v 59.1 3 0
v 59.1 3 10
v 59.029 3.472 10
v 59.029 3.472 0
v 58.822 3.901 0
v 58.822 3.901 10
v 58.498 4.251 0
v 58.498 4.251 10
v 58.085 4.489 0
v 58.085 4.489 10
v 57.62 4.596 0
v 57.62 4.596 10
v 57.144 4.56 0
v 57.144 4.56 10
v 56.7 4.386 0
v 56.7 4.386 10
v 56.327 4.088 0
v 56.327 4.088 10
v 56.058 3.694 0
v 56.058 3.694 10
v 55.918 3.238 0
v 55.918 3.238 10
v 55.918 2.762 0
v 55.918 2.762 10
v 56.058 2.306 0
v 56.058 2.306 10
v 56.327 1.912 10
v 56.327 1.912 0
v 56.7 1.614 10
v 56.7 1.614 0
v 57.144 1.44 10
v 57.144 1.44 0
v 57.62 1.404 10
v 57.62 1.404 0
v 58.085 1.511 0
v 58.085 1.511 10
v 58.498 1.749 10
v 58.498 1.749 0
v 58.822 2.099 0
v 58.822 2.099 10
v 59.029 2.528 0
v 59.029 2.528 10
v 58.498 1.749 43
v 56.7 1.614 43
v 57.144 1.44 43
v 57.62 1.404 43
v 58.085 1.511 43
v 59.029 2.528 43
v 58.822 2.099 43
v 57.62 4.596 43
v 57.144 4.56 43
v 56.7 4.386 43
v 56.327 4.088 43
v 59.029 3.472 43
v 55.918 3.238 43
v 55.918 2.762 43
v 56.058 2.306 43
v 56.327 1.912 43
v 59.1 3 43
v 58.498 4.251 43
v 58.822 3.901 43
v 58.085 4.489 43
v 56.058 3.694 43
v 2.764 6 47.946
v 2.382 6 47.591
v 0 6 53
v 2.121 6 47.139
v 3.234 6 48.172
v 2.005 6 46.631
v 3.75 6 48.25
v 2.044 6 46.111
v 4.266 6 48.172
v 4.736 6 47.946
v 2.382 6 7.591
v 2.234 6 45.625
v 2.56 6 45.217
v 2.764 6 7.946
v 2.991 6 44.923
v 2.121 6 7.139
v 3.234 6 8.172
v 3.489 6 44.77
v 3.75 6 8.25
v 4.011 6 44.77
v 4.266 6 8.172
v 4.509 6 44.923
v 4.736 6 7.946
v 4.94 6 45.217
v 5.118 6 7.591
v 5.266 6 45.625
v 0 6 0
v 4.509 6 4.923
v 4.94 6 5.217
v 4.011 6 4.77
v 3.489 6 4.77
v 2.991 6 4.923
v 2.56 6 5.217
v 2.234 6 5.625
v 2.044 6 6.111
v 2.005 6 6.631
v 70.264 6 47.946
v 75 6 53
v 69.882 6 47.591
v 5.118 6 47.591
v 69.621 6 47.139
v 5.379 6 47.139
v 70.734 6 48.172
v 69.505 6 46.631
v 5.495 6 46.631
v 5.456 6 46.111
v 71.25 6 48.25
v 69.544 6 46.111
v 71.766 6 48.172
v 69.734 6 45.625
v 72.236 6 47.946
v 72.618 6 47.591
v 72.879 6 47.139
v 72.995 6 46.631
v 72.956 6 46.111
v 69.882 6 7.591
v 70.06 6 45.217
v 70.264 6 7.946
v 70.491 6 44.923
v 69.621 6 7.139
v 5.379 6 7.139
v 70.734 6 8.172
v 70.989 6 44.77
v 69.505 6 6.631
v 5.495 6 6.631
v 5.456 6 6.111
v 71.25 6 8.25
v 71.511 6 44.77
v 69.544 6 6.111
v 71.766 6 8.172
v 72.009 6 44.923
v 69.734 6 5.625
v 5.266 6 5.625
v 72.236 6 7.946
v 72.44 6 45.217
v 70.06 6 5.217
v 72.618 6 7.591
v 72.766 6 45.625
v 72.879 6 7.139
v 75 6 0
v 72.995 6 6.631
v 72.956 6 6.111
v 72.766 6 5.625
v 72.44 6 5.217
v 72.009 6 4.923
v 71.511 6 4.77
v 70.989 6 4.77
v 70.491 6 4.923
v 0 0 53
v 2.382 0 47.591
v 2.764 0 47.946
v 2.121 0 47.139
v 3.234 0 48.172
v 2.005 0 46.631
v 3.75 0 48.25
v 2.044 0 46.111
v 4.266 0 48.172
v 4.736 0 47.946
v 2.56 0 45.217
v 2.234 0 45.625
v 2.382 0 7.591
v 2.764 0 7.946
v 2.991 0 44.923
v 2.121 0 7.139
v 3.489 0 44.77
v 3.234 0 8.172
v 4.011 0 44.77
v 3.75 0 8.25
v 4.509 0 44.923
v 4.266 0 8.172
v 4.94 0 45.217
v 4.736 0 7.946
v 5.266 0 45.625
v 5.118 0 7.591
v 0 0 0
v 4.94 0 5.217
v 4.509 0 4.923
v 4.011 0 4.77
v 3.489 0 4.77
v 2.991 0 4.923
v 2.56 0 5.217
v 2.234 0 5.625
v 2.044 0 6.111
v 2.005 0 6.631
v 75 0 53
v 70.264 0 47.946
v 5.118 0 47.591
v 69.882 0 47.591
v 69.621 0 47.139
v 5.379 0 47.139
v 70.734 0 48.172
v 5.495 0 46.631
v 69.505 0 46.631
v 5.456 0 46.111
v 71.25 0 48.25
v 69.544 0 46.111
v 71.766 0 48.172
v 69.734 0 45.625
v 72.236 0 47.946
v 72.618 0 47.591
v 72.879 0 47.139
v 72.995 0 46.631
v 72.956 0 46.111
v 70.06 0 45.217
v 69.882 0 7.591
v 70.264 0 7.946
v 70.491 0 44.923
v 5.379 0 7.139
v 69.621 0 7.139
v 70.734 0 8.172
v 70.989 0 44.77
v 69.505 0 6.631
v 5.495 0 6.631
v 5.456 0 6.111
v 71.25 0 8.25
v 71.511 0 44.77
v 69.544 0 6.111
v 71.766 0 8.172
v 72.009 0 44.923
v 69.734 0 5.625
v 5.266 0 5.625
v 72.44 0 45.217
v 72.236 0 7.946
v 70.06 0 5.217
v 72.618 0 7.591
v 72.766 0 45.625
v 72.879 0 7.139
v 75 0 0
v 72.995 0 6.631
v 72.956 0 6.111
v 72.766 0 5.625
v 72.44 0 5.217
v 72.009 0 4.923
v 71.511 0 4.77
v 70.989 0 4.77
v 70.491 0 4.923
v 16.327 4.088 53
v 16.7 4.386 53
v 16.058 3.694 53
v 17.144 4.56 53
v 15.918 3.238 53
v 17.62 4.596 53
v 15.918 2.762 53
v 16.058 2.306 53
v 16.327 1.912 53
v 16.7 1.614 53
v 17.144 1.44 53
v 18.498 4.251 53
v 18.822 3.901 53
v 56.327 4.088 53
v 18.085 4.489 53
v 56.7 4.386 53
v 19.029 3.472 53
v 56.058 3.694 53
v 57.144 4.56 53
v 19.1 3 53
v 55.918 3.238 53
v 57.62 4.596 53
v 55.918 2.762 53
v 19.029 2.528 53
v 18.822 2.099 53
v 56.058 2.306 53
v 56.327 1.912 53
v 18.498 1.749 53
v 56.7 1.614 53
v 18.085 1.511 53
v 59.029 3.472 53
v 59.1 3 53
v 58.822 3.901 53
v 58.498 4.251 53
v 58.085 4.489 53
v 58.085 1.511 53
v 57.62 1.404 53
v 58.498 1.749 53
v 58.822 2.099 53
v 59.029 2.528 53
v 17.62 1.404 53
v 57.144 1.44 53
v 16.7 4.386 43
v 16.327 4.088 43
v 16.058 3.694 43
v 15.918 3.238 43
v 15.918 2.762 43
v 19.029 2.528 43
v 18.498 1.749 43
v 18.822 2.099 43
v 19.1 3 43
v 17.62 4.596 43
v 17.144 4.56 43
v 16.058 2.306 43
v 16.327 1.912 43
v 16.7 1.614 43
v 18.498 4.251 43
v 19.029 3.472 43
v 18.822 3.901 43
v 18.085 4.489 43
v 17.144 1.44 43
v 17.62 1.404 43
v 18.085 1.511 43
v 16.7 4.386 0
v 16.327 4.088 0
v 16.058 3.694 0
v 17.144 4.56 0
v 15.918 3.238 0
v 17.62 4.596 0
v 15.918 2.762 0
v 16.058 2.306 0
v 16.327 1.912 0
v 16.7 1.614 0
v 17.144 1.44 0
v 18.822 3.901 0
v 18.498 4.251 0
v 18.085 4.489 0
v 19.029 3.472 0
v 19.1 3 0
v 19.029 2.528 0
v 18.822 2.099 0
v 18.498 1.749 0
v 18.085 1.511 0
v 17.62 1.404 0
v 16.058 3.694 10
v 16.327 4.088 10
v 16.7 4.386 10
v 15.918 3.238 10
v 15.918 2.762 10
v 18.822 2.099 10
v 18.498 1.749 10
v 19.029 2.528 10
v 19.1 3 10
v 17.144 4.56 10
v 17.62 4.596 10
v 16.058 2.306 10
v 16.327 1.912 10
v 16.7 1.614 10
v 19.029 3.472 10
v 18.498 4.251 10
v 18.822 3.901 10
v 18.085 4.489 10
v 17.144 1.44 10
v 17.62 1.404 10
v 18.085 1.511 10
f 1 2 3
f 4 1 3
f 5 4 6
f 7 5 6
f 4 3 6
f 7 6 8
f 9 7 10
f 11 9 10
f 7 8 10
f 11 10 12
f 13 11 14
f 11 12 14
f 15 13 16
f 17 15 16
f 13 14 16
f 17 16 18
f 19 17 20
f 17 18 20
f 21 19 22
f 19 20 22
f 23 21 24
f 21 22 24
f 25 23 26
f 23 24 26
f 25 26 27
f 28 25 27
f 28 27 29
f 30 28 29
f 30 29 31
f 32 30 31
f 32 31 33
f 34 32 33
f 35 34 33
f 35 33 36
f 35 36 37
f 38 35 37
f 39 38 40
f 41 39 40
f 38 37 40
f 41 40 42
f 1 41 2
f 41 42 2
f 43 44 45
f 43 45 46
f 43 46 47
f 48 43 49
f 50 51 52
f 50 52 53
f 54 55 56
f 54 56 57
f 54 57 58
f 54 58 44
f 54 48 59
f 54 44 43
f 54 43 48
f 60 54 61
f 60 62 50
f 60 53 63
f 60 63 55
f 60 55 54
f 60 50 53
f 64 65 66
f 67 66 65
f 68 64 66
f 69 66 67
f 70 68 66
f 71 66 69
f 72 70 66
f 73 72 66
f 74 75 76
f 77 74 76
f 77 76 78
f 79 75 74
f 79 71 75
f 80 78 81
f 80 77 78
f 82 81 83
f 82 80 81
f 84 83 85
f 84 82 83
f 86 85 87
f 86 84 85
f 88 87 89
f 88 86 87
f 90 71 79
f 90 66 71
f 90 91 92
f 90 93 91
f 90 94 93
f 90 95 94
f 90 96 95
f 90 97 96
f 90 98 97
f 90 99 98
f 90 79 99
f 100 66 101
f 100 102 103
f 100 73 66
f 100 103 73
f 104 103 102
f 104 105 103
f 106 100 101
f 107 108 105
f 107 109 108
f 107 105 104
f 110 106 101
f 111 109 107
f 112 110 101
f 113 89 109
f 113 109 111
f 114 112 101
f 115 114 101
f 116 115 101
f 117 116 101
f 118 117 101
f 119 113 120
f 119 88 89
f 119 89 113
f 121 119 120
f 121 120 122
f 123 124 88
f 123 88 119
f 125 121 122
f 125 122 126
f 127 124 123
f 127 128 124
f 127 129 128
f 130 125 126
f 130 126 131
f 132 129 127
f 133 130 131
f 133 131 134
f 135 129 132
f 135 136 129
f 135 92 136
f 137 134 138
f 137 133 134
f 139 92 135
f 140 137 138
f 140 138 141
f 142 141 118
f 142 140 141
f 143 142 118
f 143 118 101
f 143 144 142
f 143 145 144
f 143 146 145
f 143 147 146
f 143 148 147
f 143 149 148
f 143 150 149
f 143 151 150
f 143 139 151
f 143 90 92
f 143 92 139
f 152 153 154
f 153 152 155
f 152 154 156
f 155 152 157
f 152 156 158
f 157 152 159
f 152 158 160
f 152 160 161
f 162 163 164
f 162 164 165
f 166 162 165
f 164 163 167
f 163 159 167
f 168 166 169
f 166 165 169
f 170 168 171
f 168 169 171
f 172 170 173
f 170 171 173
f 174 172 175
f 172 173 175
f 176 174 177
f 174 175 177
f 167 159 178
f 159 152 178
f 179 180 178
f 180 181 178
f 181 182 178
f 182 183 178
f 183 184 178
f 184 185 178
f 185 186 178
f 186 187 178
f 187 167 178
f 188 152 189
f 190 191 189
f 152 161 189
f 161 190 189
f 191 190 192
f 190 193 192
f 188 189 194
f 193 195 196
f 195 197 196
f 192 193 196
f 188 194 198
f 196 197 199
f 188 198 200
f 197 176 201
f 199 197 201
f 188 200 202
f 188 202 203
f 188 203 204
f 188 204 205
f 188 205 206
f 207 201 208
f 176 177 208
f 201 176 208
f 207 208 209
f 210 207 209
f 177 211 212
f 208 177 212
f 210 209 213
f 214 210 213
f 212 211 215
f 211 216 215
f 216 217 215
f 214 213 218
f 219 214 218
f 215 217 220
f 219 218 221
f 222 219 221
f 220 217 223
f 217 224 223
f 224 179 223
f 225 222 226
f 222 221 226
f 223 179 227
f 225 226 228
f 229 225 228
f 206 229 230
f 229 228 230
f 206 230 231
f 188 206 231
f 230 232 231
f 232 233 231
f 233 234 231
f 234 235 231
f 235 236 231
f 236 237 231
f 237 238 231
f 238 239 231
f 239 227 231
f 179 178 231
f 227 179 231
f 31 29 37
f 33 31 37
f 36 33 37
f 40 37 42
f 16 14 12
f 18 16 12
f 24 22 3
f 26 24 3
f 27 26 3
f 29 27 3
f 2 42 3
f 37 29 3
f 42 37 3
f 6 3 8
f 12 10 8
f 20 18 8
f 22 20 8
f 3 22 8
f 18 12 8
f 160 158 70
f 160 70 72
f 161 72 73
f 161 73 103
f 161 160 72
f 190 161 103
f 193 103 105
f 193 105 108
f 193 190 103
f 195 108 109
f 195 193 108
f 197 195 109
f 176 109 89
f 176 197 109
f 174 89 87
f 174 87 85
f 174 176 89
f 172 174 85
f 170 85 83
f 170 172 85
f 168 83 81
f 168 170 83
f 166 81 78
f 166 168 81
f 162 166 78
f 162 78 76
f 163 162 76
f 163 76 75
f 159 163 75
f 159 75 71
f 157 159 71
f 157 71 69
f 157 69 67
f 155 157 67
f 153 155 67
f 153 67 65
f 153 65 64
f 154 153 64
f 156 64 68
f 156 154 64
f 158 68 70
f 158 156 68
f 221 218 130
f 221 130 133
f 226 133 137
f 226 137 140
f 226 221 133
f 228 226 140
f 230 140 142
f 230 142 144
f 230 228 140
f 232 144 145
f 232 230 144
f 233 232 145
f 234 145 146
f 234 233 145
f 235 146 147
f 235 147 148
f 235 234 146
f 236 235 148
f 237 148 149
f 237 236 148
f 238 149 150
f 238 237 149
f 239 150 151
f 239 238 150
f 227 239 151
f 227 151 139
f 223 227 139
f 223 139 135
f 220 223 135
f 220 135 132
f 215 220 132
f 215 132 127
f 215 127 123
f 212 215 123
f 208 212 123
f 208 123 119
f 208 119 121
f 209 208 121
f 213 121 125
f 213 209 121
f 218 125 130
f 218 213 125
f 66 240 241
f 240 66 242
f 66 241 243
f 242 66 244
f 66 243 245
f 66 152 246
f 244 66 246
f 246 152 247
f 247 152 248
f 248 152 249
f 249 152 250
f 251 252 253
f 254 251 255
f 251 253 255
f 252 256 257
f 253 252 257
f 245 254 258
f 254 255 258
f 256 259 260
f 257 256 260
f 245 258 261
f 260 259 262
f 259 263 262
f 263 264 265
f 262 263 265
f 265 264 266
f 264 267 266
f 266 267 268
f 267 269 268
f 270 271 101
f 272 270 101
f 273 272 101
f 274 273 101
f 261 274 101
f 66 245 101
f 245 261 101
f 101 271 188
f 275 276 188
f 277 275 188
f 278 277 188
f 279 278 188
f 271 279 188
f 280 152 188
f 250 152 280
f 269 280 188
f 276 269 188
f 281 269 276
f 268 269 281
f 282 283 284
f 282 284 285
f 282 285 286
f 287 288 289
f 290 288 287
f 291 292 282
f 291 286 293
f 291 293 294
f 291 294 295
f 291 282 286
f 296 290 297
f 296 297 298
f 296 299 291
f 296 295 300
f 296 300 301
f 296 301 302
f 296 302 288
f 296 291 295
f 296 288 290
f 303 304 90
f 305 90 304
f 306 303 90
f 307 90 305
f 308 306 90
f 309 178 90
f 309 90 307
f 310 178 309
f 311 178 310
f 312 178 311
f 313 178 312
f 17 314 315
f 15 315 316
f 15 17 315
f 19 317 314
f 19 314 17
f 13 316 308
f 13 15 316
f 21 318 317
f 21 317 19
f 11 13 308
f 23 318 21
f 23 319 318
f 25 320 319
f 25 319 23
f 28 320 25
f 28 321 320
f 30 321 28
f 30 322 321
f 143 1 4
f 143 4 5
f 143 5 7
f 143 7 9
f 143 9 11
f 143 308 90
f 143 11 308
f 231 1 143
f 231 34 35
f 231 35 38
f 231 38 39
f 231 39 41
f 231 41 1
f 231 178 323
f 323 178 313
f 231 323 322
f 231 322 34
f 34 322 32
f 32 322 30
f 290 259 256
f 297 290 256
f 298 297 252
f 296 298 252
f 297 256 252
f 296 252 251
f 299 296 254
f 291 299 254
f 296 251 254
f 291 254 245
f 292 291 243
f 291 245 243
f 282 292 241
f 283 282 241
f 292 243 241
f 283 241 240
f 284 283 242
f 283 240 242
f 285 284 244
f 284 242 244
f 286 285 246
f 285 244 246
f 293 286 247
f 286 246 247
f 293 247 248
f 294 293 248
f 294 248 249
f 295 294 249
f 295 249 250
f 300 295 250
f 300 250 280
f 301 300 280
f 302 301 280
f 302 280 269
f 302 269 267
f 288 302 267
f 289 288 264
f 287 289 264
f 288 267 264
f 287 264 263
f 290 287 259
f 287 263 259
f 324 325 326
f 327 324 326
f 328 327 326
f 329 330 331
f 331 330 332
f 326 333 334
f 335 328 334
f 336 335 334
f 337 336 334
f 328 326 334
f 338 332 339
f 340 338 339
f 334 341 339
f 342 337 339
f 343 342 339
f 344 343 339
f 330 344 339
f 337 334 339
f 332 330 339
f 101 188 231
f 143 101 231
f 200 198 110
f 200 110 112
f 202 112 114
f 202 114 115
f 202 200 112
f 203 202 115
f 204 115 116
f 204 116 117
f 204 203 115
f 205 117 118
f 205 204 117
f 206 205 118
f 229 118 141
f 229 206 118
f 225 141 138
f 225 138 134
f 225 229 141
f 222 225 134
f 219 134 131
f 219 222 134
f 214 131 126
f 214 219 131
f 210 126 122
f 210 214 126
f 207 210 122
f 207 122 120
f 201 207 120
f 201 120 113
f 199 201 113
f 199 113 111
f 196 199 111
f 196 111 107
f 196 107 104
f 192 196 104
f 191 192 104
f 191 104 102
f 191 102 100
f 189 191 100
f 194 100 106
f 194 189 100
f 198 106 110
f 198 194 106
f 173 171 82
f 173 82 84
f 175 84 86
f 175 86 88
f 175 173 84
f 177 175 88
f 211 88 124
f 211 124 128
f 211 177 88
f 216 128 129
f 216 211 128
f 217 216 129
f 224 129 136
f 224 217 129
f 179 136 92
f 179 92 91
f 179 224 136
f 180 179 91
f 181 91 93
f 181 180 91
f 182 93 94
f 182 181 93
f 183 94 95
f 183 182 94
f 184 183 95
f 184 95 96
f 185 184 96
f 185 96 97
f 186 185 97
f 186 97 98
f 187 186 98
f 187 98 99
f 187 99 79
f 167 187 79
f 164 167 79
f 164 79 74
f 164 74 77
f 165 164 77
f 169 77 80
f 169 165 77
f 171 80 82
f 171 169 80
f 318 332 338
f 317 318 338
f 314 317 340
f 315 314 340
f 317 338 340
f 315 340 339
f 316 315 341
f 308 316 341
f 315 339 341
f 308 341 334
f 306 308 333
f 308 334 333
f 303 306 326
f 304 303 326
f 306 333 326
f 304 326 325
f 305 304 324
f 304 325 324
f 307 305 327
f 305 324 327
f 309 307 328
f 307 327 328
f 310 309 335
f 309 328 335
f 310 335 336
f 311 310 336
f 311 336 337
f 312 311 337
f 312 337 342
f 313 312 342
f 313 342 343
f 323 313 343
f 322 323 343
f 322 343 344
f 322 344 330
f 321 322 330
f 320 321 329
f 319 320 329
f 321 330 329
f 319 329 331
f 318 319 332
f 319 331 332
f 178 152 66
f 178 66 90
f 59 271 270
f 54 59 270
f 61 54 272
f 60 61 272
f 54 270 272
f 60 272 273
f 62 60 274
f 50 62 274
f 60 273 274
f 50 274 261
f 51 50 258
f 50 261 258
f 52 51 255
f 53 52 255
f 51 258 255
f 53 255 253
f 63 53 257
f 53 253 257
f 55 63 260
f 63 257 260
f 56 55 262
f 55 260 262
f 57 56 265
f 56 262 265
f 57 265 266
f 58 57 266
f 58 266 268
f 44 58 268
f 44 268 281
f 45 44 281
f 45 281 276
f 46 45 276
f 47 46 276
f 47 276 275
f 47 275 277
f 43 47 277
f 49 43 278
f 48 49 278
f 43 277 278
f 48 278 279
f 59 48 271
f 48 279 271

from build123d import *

# Parameters (mm, degrees)
SKETCH1_W           = 75
SKETCH1_H           = 53
SKETCH1_R           = 1.75
BOSS_EXTRUDE8_DEPTH = 6
SKETCH8_R           = 1.6
CUT_EXTRUDE1_DEPTH  = 10
CUT_EXTRUDE2_START  = -43
SKETCH8_3_R         = 1.6
CUT_EXTRUDE2_DEPTH  = 10


with BuildPart() as part:
    # Sketch1 → Boss-Extrude8 (new body)
    with BuildSketch(Plane(origin=(0, 0, 0), x_dir=(1, 0, 0), z_dir=(0, 1, 0))):
        with Locations((37.5, -26.5)):
            Rectangle(SKETCH1_W, SKETCH1_H)
        with Locations(Location((71.25, -6.5, 0), (0, 0, 270))):
            Circle(SKETCH1_R, mode=Mode.SUBTRACT)
        with Locations(Location((3.75, -6.5, 0), (0, 0, 270))):
            Circle(SKETCH1_R, mode=Mode.SUBTRACT)
        with Locations(Location((71.25, -46.5, 0), (0, 0, 270))):
            Circle(SKETCH1_R, mode=Mode.SUBTRACT)
        with Locations(Location((3.75, -46.5, 0), (0, 0, 270))):
            Circle(SKETCH1_R, mode=Mode.SUBTRACT)
    extrude(amount=BOSS_EXTRUDE8_DEPTH)

    # Sketch8 → Cut-Extrude1 (cut)
    with BuildSketch(Plane.XY.offset(53)):
        with Locations((17.5, 3)):
            Circle(SKETCH8_R)
        with Locations((57.5, 3)):
            Circle(SKETCH8_R)
    extrude(amount=-CUT_EXTRUDE1_DEPTH, mode=Mode.SUBTRACT)

    # Sketch8<3> → Cut-Extrude2 (cut)
    with BuildSketch(Plane.XY.offset(53).offset(CUT_EXTRUDE2_START)):
        with Locations((17.5, 3)):
            Circle(SKETCH8_3_R)
        with Locations((57.5, 3)):
            Circle(SKETCH8_3_R)
    extrude(amount=-CUT_EXTRUDE2_DEPTH, mode=Mode.SUBTRACT)


solid = part.part
